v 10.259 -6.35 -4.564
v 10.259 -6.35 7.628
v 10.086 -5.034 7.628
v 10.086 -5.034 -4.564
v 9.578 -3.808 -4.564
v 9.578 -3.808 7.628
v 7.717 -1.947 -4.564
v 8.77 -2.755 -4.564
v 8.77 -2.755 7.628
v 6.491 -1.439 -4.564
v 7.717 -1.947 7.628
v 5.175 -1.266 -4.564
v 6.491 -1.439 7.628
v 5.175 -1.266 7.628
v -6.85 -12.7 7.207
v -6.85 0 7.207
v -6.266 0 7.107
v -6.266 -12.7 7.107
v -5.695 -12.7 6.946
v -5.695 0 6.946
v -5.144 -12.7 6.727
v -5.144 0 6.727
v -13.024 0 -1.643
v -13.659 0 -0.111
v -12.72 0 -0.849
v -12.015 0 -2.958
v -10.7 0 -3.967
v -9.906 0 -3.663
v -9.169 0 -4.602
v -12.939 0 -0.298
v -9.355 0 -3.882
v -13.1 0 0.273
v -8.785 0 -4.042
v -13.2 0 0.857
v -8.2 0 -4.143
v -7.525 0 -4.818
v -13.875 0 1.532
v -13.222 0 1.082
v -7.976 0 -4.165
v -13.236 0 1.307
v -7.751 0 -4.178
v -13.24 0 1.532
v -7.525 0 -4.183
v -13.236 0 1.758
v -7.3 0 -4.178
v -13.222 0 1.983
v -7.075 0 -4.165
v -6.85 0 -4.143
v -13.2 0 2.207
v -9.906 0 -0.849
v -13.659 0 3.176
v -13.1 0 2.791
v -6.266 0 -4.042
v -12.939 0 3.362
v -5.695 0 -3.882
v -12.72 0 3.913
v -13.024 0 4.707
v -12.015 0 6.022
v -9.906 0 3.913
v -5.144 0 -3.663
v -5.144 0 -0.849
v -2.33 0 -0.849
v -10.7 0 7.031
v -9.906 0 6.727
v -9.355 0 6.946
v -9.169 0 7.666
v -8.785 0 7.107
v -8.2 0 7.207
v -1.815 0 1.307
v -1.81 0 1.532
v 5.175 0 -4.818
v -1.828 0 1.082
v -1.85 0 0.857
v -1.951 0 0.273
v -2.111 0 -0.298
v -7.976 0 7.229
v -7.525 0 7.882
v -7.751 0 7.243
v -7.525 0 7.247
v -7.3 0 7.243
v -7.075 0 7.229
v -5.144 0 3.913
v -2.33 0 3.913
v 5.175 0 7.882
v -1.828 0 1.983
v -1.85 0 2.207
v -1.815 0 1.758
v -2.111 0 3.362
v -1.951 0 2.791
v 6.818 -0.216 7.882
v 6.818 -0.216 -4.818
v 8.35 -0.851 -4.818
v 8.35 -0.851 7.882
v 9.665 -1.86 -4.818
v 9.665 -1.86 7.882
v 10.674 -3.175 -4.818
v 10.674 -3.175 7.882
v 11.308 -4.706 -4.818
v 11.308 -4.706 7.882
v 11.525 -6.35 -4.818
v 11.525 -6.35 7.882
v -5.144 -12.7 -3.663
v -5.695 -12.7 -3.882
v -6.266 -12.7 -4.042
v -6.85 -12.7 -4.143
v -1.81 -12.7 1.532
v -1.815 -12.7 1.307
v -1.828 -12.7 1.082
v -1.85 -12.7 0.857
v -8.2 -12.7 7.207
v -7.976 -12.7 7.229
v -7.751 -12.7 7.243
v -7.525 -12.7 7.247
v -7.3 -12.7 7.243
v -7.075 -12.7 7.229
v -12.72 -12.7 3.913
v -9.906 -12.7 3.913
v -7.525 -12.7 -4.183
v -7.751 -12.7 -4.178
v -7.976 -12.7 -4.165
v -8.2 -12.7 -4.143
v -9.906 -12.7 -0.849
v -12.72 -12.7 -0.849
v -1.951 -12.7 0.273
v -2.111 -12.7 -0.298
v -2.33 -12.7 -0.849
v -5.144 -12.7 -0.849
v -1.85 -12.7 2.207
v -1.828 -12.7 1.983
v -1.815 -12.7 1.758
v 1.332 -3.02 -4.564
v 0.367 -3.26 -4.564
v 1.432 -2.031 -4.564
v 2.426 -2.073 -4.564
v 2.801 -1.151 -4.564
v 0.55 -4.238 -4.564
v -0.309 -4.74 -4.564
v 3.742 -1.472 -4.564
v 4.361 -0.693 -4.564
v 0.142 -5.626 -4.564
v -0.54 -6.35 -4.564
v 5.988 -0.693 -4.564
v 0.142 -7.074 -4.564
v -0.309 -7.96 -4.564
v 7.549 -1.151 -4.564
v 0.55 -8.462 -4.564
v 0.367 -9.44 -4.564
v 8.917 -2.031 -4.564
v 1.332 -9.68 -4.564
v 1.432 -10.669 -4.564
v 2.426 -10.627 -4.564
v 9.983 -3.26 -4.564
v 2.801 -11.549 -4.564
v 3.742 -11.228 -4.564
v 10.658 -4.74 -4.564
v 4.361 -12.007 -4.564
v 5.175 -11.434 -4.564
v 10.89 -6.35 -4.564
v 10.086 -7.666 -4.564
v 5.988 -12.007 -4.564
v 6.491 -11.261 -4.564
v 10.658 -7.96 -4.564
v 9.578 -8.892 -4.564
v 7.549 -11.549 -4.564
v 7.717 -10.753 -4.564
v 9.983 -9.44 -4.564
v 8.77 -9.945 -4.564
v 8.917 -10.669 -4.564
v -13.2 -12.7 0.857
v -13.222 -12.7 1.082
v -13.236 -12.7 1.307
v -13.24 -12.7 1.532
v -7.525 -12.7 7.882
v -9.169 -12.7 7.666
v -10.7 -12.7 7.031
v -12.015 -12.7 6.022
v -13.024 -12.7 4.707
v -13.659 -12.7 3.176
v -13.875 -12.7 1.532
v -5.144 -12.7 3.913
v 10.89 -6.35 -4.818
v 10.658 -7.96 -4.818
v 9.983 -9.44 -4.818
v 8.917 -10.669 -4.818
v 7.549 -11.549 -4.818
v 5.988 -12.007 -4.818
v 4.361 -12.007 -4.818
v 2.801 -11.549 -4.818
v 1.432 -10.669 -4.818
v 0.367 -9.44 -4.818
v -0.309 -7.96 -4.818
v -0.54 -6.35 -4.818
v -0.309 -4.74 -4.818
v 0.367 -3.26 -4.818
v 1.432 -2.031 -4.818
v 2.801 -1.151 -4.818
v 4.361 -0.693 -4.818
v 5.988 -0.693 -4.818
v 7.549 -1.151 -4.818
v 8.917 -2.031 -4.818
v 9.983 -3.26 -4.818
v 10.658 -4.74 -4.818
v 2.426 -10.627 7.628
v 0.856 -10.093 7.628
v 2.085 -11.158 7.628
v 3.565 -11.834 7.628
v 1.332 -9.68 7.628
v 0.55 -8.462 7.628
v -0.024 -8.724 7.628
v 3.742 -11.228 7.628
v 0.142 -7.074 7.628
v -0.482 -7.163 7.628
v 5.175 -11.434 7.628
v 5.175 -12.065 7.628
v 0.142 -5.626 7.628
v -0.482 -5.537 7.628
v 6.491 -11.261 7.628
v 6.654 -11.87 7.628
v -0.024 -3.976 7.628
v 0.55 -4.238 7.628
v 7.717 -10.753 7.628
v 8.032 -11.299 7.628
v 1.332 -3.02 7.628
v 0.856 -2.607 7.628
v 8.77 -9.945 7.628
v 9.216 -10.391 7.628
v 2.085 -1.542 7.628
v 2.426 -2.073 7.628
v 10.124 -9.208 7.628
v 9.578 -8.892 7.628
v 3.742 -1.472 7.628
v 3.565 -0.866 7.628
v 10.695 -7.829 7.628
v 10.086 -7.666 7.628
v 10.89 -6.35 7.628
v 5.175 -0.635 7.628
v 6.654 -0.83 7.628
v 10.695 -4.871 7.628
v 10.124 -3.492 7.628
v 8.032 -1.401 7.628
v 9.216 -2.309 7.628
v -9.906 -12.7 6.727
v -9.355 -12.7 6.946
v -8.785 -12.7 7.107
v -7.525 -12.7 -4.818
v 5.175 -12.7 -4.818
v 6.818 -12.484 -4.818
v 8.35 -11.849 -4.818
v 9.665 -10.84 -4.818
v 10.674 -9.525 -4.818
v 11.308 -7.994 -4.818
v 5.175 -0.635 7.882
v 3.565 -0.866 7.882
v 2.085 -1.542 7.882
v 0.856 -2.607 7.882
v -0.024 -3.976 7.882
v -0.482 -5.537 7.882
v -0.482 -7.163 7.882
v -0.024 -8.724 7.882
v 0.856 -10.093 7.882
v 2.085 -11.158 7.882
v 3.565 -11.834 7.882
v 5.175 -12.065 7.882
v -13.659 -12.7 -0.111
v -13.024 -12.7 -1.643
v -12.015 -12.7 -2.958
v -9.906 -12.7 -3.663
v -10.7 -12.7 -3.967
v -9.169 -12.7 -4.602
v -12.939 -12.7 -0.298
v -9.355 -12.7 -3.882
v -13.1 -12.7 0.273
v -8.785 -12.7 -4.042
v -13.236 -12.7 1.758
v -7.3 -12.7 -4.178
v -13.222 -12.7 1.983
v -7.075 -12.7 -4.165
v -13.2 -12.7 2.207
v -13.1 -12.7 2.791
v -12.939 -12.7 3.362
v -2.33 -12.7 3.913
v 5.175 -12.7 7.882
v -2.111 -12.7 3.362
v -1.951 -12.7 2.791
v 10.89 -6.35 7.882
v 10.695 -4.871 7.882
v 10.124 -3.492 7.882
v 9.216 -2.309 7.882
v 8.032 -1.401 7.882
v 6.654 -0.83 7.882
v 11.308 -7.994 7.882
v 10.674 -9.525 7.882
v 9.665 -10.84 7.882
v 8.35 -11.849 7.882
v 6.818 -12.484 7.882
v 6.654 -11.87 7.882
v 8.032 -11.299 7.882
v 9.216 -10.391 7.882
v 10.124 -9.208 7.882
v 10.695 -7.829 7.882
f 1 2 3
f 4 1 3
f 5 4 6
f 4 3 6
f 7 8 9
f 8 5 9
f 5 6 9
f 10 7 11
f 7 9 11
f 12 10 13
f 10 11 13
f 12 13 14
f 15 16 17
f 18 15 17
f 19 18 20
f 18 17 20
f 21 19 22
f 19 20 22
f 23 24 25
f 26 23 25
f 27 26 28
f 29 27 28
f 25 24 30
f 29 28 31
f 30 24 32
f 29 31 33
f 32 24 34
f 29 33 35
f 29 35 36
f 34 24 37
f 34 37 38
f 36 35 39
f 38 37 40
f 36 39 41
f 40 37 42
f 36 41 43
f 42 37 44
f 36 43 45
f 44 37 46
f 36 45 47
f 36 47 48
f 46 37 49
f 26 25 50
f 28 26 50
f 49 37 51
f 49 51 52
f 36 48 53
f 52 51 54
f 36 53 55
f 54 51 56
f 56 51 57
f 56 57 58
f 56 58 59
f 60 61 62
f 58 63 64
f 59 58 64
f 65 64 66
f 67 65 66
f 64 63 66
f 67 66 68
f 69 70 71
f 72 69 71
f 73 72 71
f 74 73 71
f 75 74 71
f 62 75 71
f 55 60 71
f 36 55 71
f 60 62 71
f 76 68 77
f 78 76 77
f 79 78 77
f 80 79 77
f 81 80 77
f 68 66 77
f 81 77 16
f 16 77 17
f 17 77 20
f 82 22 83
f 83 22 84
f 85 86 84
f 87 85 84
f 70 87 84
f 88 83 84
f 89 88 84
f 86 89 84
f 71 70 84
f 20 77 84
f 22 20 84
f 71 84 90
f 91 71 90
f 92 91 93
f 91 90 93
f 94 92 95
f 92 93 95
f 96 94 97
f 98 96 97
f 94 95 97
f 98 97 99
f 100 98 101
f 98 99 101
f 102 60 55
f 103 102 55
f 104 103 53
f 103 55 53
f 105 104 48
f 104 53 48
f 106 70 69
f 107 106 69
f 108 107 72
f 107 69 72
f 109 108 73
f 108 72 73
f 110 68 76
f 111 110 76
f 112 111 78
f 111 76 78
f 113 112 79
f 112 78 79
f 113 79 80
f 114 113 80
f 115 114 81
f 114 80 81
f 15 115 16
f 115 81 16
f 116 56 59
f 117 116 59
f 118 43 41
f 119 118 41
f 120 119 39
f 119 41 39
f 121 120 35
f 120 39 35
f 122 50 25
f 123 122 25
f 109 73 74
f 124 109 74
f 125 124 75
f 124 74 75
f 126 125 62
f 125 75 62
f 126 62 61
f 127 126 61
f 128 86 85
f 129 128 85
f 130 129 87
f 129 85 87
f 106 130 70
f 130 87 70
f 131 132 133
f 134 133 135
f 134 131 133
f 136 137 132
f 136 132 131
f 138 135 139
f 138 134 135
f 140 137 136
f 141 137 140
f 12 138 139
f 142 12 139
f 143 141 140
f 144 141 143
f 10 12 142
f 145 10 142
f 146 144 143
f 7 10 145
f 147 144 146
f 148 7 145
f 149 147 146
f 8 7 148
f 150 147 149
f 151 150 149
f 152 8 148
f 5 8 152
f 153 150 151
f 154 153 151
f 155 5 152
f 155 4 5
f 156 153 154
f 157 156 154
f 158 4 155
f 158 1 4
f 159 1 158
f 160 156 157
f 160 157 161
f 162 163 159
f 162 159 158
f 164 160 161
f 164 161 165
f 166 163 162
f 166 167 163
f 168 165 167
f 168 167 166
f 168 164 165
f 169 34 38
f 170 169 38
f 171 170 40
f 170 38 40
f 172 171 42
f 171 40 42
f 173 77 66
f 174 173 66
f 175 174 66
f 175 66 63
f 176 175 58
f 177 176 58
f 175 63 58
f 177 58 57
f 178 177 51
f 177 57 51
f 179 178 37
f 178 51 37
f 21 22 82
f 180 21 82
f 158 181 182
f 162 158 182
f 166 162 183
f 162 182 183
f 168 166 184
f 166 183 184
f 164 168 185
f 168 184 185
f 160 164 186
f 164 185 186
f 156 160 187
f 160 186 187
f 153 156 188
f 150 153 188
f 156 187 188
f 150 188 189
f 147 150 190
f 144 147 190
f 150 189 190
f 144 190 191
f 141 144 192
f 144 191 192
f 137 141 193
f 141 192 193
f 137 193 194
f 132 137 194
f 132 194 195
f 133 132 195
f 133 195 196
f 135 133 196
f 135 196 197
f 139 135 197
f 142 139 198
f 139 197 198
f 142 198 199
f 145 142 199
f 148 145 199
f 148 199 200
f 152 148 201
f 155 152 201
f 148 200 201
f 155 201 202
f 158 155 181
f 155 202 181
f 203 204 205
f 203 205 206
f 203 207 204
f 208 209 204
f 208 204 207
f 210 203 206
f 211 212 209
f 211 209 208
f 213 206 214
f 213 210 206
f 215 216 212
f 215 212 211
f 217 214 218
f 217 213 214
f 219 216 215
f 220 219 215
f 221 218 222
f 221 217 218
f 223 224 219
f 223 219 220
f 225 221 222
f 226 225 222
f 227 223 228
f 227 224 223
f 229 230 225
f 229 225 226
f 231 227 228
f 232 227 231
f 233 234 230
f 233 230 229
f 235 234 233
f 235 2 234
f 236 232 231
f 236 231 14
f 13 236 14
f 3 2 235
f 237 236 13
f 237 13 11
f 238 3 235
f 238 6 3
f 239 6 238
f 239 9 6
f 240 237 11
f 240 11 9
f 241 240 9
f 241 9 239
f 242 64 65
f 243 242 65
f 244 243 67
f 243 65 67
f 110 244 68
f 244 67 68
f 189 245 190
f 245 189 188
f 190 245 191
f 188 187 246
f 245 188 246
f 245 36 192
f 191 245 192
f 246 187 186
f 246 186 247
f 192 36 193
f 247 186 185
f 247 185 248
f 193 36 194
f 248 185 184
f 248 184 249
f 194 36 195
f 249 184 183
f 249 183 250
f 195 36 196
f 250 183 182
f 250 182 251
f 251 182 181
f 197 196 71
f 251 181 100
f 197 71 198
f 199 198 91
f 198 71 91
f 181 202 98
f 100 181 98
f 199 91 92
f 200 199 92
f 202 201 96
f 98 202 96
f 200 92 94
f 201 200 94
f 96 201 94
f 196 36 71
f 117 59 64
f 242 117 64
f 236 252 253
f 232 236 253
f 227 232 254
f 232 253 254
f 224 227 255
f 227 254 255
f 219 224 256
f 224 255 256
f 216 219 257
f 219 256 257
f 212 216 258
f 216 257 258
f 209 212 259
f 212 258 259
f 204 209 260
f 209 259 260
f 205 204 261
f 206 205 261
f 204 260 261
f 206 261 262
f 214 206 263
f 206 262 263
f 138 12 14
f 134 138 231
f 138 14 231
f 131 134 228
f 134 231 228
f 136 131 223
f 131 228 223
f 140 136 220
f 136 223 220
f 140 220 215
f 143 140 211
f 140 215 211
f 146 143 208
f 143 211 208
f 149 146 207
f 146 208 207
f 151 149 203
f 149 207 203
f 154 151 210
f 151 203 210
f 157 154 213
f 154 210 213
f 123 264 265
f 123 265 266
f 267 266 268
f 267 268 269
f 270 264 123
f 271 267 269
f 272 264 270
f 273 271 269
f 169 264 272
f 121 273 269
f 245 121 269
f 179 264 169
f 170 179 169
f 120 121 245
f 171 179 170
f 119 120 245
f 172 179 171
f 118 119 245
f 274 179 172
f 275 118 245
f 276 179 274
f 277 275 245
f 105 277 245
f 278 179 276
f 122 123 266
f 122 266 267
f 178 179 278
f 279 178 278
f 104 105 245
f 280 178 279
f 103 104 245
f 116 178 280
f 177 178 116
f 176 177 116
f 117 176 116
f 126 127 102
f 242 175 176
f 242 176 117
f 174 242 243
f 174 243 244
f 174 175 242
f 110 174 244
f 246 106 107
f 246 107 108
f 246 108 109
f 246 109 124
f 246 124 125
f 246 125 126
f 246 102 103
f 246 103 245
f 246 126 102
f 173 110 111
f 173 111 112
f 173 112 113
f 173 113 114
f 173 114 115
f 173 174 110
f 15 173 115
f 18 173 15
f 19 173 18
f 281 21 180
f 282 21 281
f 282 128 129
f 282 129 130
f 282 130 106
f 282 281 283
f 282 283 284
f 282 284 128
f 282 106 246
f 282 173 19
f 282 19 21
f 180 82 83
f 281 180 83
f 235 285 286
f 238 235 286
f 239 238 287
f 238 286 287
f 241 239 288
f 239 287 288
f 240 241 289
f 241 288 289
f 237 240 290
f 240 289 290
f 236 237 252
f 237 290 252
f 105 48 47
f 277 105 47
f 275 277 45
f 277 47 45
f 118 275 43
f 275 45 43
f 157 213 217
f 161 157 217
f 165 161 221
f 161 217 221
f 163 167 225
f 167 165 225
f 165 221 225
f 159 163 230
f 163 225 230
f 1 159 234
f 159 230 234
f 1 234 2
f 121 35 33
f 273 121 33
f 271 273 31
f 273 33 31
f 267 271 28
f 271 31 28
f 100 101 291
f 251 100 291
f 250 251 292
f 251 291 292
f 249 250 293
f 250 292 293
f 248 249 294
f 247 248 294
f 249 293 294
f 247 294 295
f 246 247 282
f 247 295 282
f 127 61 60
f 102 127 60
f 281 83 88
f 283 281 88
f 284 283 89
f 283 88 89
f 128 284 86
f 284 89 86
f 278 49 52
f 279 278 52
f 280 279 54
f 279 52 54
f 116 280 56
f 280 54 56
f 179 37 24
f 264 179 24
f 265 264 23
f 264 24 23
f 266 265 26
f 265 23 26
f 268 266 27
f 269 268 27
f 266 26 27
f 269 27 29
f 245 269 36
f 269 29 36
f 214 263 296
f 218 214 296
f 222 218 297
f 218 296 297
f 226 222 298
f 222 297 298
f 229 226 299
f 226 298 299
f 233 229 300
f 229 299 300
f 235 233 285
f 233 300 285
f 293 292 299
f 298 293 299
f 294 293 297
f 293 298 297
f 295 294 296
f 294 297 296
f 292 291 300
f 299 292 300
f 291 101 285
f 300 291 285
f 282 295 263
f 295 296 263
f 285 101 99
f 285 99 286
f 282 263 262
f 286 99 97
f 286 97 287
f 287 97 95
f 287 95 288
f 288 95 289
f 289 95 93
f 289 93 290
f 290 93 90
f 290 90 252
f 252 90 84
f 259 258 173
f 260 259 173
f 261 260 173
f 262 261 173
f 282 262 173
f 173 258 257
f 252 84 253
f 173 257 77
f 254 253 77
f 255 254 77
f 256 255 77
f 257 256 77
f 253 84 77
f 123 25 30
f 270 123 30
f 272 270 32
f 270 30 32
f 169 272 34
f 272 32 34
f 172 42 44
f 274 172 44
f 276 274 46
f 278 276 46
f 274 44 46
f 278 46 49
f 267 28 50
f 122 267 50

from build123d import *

# Parameters (mm, degrees)
F1_DEPTH = 12.7
F3_DEPTH = 12.7
F4_DEPTH = 0.254
F5_R     = 5.715
F5_R_2   = 5.0844343855
F6_DEPTH = 0.254


with BuildPart() as f1:
    # F0 (on Front) → F1 (new body)
    with BuildSketch(Plane.XZ):
        with BuildLine():
            Line((-1.1751782149, -4.8178826279), (-1.1751782149, 1.5321173721))
            ThreePointArc((-1.1751782149, 1.5321173721), (-3.0350501544, -2.9580106884), (-7.5251782149, -4.8178826279))
            Line((-7.5251782149, -4.8178826279), (-1.1751782149, -4.8178826279))
        make_face()
        with BuildLine():
            Line((-13.2001757149, 2.2071198721), (-13.8751782149, 1.5321173721))
            Line((-13.8751782149, 1.5321173721), (-13.2401782149, 1.5321173721))
            ThreePointArc((-13.2401782149, 1.5321173721), (-13.2301688246, 1.8702107672), (-13.2001757149, 2.2071198721))
        make_face()
        with BuildLine():
            Line((-13.2401782149, 1.5321173721), (-13.8751782149, 1.5321173721))
            Line((-13.8751782149, 1.5321173721), (-13.2001757149, 0.8571148721))
            ThreePointArc((-13.2001757149, 0.8571148721), (-13.2301688246, 1.1940239771), (-13.2401782149, 1.5321173721))
        make_face()
        with BuildLine():
            Line((-8.2001807149, -4.1428801279), (-7.5251782149, -4.8178826279))
            Line((-7.5251782149, -4.8178826279), (-7.5251782149, -4.1828826279))
            ThreePointArc((-7.5251782149, -4.1828826279), (-7.8632716099, -4.1728732375), (-8.2001807149, -4.1428801279))
        make_face()
        with BuildLine():
            Line((-7.5251782149, -4.1828826279), (-7.5251782149, -4.8178826279))
            Line((-7.5251782149, -4.8178826279), (-6.8501757149, -4.1428801279))
            ThreePointArc((-6.8501757149, -4.1428801279), (-7.1870848199, -4.1728732375), (-7.5251782149, -4.1828826279))
        make_face()
        with BuildLine():
            Line((-6.8501757149, 7.2071148721), (-7.5251782149, 7.8821173721))
            Line((-7.5251782149, 7.8821173721), (-7.5251782149, 7.2471173721))
            ThreePointArc((-7.5251782149, 7.2471173721), (-7.1870848199, 7.2371079818), (-6.8501757149, 7.2071148721))
        make_face()
        with BuildLine():
            Line((-7.5251782149, 7.2471173721), (-7.5251782149, 7.8821173721))
            Line((-7.5251782149, 7.8821173721), (-8.2001807149, 7.2071148721))
            ThreePointArc((-8.2001807149, 7.2071148721), (-7.8632716099, 7.2371079818), (-7.5251782149, 7.2471173721))
        make_face()
        with BuildLine():
            ThreePointArc((-1.1751782149, 1.5321173721), (-3.0350501544, 6.0222454327), (-7.5251782149, 7.8821173721))
            Line((-7.5251782149, 7.8821173721), (-6.8501757149, 7.2071148721))
            ThreePointArc((-6.8501757149, 7.2071148721), (-5.9783416171, 7.0338008908), (-5.1439282149, 6.7273915167))
            ThreePointArc((-5.1439282149, 6.7273915167), (-3.4840629604, 5.5732326266), (-2.3299040703, 3.9133673721))
            ThreePointArc((-2.3299040703, 3.9133673721), (-2.0234946962, 3.07895397), (-1.8501807149, 2.2071198721))
            Line((-1.8501807149, 2.2071198721), (-1.1751782149, 1.5321173721))
        make_face()
        with BuildLine():
            Line((-8.2001807149, 7.2071148721), (-7.5251782149, 7.8821173721))
            ThreePointArc((-7.5251782149, 7.8821173721), (-12.0153062754, 6.0222454327), (-13.8751782149, 1.5321173721))
            Line((-13.8751782149, 1.5321173721), (-13.2001757149, 2.2071198721))
            ThreePointArc((-13.2001757149, 2.2071198721), (-13.0268617336, 3.07895397), (-12.7204523595, 3.9133673721))
            ThreePointArc((-12.7204523595, 3.9133673721), (-11.5662934694, 5.5732326266), (-9.9064282149, 6.7273915167))
            ThreePointArc((-9.9064282149, 6.7273915167), (-9.0720148127, 7.0338008908), (-8.2001807149, 7.2071148721))
        make_face()
        with BuildLine():
            Line((-13.2001757149, 0.8571148721), (-13.8751782149, 1.5321173721))
            ThreePointArc((-13.8751782149, 1.5321173721), (-12.0153062754, -2.9580106884), (-7.5251782149, -4.8178826279))
            Line((-7.5251782149, -4.8178826279), (-8.2001807149, -4.1428801279))
            ThreePointArc((-8.2001807149, -4.1428801279), (-9.0720148127, -3.9695661465), (-9.9064282149, -3.6631567725))
            ThreePointArc((-9.9064282149, -3.6631567725), (-11.5662934694, -2.5089978823), (-12.7204523595, -0.8491326279))
            ThreePointArc((-12.7204523595, -0.8491326279), (-13.0268617336, -0.0147192257), (-13.2001757149, 0.8571148721))
        make_face()
        with BuildLine():
            ThreePointArc((-7.5251782149, -4.8178826279), (-3.0350501544, -2.9580106884), (-1.1751782149, 1.5321173721))
            Line((-1.1751782149, 1.5321173721), (-1.8501807149, 0.8571148721))
            ThreePointArc((-1.8501807149, 0.8571148721), (-2.0234946962, -0.0147192257), (-2.3299040703, -0.8491326279))
            ThreePointArc((-2.3299040703, -0.8491326279), (-3.4840629604, -2.5089978823), (-5.1439282149, -3.6631567725))
            ThreePointArc((-5.1439282149, -3.6631567725), (-5.9783416171, -3.9695661465), (-6.8501757149, -4.1428801279))
            Line((-6.8501757149, -4.1428801279), (-7.5251782149, -4.8178826279))
        make_face()
        with BuildLine():
            Line((-9.9064282149, 5.5008673721), (-9.9064282149, 6.7273915167))
            ThreePointArc((-9.9064282149, 6.7273915167), (-11.5662934694, 5.5732326266), (-12.7204523595, 3.9133673721))
            Line((-12.7204523595, 3.9133673721), (-11.4939282149, 3.9133673721))
            Line((-11.4939282149, 3.9133673721), (-10.7001782149, 4.7071173721))
            Line((-10.7001782149, 4.7071173721), (-9.9064282149, 5.5008673721))
        make_face()
        Polygon((-9.9064282149, 3.9133673721), (-9.9064282149, 5.5008673721), (-10.7001782149, 4.7071173721), align=None)
        Polygon((-10.7001782149, 4.7071173721), (-11.4939282149, 3.9133673721), (-9.9064282149, 3.9133673721), align=None)
        Polygon((-4.3501782149, 4.7071173721), (-5.1439282149, 5.5008673721), (-5.1439282149, 3.9133673721), align=None)
        with BuildLine():
            ThreePointArc((-2.3299040703, 3.9133673721), (-3.4840629604, 5.5732326266), (-5.1439282149, 6.7273915167))
            Line((-5.1439282149, 6.7273915167), (-5.1439282149, 5.5008673721))
            Line((-5.1439282149, 5.5008673721), (-4.3501782149, 4.7071173721))
            Line((-4.3501782149, 4.7071173721), (-3.5564282149, 3.9133673721))
            Line((-3.5564282149, 3.9133673721), (-2.3299040703, 3.9133673721))
        make_face()
        Polygon((-5.1439282149, 3.9133673721), (-3.5564282149, 3.9133673721), (-4.3501782149, 4.7071173721), align=None)
        with BuildLine():
            ThreePointArc((-5.1439282149, -3.6631567725), (-3.4840629604, -2.5089978823), (-2.3299040703, -0.8491326279))
            Line((-2.3299040703, -0.8491326279), (-3.5564282149, -0.8491326279))
            Line((-3.5564282149, -0.8491326279), (-4.3501782149, -1.6428826279))
            Line((-4.3501782149, -1.6428826279), (-5.1439282149, -2.4366326279))
            Line((-5.1439282149, -2.4366326279), (-5.1439282149, -3.6631567725))
        make_face()
        Polygon((-4.3501782149, -1.6428826279), (-3.5564282149, -0.8491326279), (-5.1439282149, -0.8491326279), align=None)
        Polygon((-5.1439282149, -0.8491326279), (-5.1439282149, -2.4366326279), (-4.3501782149, -1.6428826279), align=None)
        with BuildLine():
            Line((-11.4939282149, -0.8491326279), (-12.7204523595, -0.8491326279))
            ThreePointArc((-12.7204523595, -0.8491326279), (-11.5662934694, -2.5089978823), (-9.9064282149, -3.6631567725))
            Line((-9.9064282149, -3.6631567725), (-9.9064282149, -2.4366326279))
            Line((-9.9064282149, -2.4366326279), (-10.7001782149, -1.6428826279))
            Line((-10.7001782149, -1.6428826279), (-11.4939282149, -0.8491326279))
        make_face()
        Polygon((-10.7001782149, -1.6428826279), (-9.9064282149, -2.4366326279), (-9.9064282149, -0.8491326279), align=None)
        Polygon((-9.9064282149, -0.8491326279), (-11.4939282149, -0.8491326279), (-10.7001782149, -1.6428826279), align=None)
        with BuildLine():
            Line((-1.8101782149, 1.5321173721), (-1.1751782149, 1.5321173721))
            Line((-1.1751782149, 1.5321173721), (-1.8501807149, 2.2071198721))
            ThreePointArc((-1.8501807149, 2.2071198721), (-1.8201876053, 1.8702107672), (-1.8101782149, 1.5321173721))
        make_face()
        with BuildLine():
            Line((-1.8501807149, 0.8571148721), (-1.1751782149, 1.5321173721))
            Line((-1.1751782149, 1.5321173721), (-1.8101782149, 1.5321173721))
            ThreePointArc((-1.8101782149, 1.5321173721), (-1.8201876053, 1.1940239771), (-1.8501807149, 0.8571148721))
        make_face()
        with BuildLine():
            Line((-1.1751782149, 7.8821173721), (-7.5251782149, 7.8821173721))
            ThreePointArc((-7.5251782149, 7.8821173721), (-3.0350501544, 6.0222454327), (-1.1751782149, 1.5321173721))
            Line((-1.1751782149, 1.5321173721), (-1.1751782149, 7.8821173721))
        make_face()
        Polygon((11.5248217851, 7.8821173721), (-1.1751782149, 7.8821173721), (-1.1751782149, 1.5321173721), (-1.1751782149, -4.8178826279), (11.5248217851, -4.8178826279), align=None)
    extrude(amount=F1_DEPTH)

    # F2 (on face) → F3 (cut)
    with BuildSketch(Plane.XY.offset(7.8821173721)):
        with BuildLine():
            Line((11.5248217851, 0), (5.1748217851, 0))
            ThreePointArc((5.1748217851, 0), (9.6649498456, -1.8598719395), (11.5248217851, -6.35))
            Line((11.5248217851, -6.35), (11.5248217851, 0))
        make_face()
        with BuildLine():
            Line((11.5248217851, -12.7), (11.5248217851, -6.35))
            ThreePointArc((11.5248217851, -6.35), (9.6649498456, -10.8401280605), (5.1748217851, -12.7))
            Line((5.1748217851, -12.7), (11.5248217851, -12.7))
        make_face()
        with BuildLine():
            Line((5.1748217851, -11.4344343855), (5.1748217851, -1.2655656145))
            ThreePointArc((5.1748217851, -1.2655656145), (0.0903873996, -6.35), (5.1748217851, -11.4344343855))
        make_face()
        with BuildLine():
            ThreePointArc((10.2592561706, -6.35), (8.7700598176, -2.7547619675), (5.1748217851, -1.2655656145))
            Line((5.1748217851, -1.2655656145), (5.1748217851, -11.4344343855))
            ThreePointArc((5.1748217851, -11.4344343855), (8.7700598176, -9.9452380325), (10.2592561706, -6.35))
        make_face()
    extrude(amount=-F3_DEPTH, mode=Mode.SUBTRACT)

    # F2 (on face) → F4 (cut)
    with BuildSketch(Plane.XY.offset(7.8821173721)):
        with BuildLine():
            Line((5.1748217851, -1.2655656145), (5.1748217851, -0.635))
            ThreePointArc((5.1748217851, -0.635), (-0.5401782149, -6.35), (5.1748217851, -12.065))
            Line((5.1748217851, -12.065), (5.1748217851, -11.4344343855))
            ThreePointArc((5.1748217851, -11.4344343855), (0.0903873996, -6.35), (5.1748217851, -1.2655656145))
        make_face()
        with BuildLine():
            ThreePointArc((10.8898217851, -6.35), (9.2159370396, -2.3088847455), (5.1748217851, -0.635))
            Line((5.1748217851, -0.635), (5.1748217851, -1.2655656145))
            ThreePointArc((5.1748217851, -1.2655656145), (8.7700598176, -2.7547619675), (10.2592561706, -6.35))
            ThreePointArc((10.2592561706, -6.35), (8.7700598176, -9.9452380325), (5.1748217851, -11.4344343855))
            Line((5.1748217851, -11.4344343855), (5.1748217851, -12.065))
            ThreePointArc((5.1748217851, -12.065), (9.2159370396, -10.3911152545), (10.8898217851, -6.35))
        make_face()
    extrude(amount=-F4_DEPTH, mode=Mode.SUBTRACT)

    # F5 (on face) → F6 (cut)
    with BuildSketch(Plane(origin=(0, 0, -4.8178826279), x_dir=(1, 0, 0), z_dir=(0, 0, -1))):
        with Locations((5.1748217851, 6.35)):
            Circle(F5_R)
        with Locations((5.1748217851, 6.35)):
            Circle(F5_R_2, mode=Mode.SUBTRACT)
    extrude(amount=-F6_DEPTH, mode=Mode.SUBTRACT)


solid = f1.part
